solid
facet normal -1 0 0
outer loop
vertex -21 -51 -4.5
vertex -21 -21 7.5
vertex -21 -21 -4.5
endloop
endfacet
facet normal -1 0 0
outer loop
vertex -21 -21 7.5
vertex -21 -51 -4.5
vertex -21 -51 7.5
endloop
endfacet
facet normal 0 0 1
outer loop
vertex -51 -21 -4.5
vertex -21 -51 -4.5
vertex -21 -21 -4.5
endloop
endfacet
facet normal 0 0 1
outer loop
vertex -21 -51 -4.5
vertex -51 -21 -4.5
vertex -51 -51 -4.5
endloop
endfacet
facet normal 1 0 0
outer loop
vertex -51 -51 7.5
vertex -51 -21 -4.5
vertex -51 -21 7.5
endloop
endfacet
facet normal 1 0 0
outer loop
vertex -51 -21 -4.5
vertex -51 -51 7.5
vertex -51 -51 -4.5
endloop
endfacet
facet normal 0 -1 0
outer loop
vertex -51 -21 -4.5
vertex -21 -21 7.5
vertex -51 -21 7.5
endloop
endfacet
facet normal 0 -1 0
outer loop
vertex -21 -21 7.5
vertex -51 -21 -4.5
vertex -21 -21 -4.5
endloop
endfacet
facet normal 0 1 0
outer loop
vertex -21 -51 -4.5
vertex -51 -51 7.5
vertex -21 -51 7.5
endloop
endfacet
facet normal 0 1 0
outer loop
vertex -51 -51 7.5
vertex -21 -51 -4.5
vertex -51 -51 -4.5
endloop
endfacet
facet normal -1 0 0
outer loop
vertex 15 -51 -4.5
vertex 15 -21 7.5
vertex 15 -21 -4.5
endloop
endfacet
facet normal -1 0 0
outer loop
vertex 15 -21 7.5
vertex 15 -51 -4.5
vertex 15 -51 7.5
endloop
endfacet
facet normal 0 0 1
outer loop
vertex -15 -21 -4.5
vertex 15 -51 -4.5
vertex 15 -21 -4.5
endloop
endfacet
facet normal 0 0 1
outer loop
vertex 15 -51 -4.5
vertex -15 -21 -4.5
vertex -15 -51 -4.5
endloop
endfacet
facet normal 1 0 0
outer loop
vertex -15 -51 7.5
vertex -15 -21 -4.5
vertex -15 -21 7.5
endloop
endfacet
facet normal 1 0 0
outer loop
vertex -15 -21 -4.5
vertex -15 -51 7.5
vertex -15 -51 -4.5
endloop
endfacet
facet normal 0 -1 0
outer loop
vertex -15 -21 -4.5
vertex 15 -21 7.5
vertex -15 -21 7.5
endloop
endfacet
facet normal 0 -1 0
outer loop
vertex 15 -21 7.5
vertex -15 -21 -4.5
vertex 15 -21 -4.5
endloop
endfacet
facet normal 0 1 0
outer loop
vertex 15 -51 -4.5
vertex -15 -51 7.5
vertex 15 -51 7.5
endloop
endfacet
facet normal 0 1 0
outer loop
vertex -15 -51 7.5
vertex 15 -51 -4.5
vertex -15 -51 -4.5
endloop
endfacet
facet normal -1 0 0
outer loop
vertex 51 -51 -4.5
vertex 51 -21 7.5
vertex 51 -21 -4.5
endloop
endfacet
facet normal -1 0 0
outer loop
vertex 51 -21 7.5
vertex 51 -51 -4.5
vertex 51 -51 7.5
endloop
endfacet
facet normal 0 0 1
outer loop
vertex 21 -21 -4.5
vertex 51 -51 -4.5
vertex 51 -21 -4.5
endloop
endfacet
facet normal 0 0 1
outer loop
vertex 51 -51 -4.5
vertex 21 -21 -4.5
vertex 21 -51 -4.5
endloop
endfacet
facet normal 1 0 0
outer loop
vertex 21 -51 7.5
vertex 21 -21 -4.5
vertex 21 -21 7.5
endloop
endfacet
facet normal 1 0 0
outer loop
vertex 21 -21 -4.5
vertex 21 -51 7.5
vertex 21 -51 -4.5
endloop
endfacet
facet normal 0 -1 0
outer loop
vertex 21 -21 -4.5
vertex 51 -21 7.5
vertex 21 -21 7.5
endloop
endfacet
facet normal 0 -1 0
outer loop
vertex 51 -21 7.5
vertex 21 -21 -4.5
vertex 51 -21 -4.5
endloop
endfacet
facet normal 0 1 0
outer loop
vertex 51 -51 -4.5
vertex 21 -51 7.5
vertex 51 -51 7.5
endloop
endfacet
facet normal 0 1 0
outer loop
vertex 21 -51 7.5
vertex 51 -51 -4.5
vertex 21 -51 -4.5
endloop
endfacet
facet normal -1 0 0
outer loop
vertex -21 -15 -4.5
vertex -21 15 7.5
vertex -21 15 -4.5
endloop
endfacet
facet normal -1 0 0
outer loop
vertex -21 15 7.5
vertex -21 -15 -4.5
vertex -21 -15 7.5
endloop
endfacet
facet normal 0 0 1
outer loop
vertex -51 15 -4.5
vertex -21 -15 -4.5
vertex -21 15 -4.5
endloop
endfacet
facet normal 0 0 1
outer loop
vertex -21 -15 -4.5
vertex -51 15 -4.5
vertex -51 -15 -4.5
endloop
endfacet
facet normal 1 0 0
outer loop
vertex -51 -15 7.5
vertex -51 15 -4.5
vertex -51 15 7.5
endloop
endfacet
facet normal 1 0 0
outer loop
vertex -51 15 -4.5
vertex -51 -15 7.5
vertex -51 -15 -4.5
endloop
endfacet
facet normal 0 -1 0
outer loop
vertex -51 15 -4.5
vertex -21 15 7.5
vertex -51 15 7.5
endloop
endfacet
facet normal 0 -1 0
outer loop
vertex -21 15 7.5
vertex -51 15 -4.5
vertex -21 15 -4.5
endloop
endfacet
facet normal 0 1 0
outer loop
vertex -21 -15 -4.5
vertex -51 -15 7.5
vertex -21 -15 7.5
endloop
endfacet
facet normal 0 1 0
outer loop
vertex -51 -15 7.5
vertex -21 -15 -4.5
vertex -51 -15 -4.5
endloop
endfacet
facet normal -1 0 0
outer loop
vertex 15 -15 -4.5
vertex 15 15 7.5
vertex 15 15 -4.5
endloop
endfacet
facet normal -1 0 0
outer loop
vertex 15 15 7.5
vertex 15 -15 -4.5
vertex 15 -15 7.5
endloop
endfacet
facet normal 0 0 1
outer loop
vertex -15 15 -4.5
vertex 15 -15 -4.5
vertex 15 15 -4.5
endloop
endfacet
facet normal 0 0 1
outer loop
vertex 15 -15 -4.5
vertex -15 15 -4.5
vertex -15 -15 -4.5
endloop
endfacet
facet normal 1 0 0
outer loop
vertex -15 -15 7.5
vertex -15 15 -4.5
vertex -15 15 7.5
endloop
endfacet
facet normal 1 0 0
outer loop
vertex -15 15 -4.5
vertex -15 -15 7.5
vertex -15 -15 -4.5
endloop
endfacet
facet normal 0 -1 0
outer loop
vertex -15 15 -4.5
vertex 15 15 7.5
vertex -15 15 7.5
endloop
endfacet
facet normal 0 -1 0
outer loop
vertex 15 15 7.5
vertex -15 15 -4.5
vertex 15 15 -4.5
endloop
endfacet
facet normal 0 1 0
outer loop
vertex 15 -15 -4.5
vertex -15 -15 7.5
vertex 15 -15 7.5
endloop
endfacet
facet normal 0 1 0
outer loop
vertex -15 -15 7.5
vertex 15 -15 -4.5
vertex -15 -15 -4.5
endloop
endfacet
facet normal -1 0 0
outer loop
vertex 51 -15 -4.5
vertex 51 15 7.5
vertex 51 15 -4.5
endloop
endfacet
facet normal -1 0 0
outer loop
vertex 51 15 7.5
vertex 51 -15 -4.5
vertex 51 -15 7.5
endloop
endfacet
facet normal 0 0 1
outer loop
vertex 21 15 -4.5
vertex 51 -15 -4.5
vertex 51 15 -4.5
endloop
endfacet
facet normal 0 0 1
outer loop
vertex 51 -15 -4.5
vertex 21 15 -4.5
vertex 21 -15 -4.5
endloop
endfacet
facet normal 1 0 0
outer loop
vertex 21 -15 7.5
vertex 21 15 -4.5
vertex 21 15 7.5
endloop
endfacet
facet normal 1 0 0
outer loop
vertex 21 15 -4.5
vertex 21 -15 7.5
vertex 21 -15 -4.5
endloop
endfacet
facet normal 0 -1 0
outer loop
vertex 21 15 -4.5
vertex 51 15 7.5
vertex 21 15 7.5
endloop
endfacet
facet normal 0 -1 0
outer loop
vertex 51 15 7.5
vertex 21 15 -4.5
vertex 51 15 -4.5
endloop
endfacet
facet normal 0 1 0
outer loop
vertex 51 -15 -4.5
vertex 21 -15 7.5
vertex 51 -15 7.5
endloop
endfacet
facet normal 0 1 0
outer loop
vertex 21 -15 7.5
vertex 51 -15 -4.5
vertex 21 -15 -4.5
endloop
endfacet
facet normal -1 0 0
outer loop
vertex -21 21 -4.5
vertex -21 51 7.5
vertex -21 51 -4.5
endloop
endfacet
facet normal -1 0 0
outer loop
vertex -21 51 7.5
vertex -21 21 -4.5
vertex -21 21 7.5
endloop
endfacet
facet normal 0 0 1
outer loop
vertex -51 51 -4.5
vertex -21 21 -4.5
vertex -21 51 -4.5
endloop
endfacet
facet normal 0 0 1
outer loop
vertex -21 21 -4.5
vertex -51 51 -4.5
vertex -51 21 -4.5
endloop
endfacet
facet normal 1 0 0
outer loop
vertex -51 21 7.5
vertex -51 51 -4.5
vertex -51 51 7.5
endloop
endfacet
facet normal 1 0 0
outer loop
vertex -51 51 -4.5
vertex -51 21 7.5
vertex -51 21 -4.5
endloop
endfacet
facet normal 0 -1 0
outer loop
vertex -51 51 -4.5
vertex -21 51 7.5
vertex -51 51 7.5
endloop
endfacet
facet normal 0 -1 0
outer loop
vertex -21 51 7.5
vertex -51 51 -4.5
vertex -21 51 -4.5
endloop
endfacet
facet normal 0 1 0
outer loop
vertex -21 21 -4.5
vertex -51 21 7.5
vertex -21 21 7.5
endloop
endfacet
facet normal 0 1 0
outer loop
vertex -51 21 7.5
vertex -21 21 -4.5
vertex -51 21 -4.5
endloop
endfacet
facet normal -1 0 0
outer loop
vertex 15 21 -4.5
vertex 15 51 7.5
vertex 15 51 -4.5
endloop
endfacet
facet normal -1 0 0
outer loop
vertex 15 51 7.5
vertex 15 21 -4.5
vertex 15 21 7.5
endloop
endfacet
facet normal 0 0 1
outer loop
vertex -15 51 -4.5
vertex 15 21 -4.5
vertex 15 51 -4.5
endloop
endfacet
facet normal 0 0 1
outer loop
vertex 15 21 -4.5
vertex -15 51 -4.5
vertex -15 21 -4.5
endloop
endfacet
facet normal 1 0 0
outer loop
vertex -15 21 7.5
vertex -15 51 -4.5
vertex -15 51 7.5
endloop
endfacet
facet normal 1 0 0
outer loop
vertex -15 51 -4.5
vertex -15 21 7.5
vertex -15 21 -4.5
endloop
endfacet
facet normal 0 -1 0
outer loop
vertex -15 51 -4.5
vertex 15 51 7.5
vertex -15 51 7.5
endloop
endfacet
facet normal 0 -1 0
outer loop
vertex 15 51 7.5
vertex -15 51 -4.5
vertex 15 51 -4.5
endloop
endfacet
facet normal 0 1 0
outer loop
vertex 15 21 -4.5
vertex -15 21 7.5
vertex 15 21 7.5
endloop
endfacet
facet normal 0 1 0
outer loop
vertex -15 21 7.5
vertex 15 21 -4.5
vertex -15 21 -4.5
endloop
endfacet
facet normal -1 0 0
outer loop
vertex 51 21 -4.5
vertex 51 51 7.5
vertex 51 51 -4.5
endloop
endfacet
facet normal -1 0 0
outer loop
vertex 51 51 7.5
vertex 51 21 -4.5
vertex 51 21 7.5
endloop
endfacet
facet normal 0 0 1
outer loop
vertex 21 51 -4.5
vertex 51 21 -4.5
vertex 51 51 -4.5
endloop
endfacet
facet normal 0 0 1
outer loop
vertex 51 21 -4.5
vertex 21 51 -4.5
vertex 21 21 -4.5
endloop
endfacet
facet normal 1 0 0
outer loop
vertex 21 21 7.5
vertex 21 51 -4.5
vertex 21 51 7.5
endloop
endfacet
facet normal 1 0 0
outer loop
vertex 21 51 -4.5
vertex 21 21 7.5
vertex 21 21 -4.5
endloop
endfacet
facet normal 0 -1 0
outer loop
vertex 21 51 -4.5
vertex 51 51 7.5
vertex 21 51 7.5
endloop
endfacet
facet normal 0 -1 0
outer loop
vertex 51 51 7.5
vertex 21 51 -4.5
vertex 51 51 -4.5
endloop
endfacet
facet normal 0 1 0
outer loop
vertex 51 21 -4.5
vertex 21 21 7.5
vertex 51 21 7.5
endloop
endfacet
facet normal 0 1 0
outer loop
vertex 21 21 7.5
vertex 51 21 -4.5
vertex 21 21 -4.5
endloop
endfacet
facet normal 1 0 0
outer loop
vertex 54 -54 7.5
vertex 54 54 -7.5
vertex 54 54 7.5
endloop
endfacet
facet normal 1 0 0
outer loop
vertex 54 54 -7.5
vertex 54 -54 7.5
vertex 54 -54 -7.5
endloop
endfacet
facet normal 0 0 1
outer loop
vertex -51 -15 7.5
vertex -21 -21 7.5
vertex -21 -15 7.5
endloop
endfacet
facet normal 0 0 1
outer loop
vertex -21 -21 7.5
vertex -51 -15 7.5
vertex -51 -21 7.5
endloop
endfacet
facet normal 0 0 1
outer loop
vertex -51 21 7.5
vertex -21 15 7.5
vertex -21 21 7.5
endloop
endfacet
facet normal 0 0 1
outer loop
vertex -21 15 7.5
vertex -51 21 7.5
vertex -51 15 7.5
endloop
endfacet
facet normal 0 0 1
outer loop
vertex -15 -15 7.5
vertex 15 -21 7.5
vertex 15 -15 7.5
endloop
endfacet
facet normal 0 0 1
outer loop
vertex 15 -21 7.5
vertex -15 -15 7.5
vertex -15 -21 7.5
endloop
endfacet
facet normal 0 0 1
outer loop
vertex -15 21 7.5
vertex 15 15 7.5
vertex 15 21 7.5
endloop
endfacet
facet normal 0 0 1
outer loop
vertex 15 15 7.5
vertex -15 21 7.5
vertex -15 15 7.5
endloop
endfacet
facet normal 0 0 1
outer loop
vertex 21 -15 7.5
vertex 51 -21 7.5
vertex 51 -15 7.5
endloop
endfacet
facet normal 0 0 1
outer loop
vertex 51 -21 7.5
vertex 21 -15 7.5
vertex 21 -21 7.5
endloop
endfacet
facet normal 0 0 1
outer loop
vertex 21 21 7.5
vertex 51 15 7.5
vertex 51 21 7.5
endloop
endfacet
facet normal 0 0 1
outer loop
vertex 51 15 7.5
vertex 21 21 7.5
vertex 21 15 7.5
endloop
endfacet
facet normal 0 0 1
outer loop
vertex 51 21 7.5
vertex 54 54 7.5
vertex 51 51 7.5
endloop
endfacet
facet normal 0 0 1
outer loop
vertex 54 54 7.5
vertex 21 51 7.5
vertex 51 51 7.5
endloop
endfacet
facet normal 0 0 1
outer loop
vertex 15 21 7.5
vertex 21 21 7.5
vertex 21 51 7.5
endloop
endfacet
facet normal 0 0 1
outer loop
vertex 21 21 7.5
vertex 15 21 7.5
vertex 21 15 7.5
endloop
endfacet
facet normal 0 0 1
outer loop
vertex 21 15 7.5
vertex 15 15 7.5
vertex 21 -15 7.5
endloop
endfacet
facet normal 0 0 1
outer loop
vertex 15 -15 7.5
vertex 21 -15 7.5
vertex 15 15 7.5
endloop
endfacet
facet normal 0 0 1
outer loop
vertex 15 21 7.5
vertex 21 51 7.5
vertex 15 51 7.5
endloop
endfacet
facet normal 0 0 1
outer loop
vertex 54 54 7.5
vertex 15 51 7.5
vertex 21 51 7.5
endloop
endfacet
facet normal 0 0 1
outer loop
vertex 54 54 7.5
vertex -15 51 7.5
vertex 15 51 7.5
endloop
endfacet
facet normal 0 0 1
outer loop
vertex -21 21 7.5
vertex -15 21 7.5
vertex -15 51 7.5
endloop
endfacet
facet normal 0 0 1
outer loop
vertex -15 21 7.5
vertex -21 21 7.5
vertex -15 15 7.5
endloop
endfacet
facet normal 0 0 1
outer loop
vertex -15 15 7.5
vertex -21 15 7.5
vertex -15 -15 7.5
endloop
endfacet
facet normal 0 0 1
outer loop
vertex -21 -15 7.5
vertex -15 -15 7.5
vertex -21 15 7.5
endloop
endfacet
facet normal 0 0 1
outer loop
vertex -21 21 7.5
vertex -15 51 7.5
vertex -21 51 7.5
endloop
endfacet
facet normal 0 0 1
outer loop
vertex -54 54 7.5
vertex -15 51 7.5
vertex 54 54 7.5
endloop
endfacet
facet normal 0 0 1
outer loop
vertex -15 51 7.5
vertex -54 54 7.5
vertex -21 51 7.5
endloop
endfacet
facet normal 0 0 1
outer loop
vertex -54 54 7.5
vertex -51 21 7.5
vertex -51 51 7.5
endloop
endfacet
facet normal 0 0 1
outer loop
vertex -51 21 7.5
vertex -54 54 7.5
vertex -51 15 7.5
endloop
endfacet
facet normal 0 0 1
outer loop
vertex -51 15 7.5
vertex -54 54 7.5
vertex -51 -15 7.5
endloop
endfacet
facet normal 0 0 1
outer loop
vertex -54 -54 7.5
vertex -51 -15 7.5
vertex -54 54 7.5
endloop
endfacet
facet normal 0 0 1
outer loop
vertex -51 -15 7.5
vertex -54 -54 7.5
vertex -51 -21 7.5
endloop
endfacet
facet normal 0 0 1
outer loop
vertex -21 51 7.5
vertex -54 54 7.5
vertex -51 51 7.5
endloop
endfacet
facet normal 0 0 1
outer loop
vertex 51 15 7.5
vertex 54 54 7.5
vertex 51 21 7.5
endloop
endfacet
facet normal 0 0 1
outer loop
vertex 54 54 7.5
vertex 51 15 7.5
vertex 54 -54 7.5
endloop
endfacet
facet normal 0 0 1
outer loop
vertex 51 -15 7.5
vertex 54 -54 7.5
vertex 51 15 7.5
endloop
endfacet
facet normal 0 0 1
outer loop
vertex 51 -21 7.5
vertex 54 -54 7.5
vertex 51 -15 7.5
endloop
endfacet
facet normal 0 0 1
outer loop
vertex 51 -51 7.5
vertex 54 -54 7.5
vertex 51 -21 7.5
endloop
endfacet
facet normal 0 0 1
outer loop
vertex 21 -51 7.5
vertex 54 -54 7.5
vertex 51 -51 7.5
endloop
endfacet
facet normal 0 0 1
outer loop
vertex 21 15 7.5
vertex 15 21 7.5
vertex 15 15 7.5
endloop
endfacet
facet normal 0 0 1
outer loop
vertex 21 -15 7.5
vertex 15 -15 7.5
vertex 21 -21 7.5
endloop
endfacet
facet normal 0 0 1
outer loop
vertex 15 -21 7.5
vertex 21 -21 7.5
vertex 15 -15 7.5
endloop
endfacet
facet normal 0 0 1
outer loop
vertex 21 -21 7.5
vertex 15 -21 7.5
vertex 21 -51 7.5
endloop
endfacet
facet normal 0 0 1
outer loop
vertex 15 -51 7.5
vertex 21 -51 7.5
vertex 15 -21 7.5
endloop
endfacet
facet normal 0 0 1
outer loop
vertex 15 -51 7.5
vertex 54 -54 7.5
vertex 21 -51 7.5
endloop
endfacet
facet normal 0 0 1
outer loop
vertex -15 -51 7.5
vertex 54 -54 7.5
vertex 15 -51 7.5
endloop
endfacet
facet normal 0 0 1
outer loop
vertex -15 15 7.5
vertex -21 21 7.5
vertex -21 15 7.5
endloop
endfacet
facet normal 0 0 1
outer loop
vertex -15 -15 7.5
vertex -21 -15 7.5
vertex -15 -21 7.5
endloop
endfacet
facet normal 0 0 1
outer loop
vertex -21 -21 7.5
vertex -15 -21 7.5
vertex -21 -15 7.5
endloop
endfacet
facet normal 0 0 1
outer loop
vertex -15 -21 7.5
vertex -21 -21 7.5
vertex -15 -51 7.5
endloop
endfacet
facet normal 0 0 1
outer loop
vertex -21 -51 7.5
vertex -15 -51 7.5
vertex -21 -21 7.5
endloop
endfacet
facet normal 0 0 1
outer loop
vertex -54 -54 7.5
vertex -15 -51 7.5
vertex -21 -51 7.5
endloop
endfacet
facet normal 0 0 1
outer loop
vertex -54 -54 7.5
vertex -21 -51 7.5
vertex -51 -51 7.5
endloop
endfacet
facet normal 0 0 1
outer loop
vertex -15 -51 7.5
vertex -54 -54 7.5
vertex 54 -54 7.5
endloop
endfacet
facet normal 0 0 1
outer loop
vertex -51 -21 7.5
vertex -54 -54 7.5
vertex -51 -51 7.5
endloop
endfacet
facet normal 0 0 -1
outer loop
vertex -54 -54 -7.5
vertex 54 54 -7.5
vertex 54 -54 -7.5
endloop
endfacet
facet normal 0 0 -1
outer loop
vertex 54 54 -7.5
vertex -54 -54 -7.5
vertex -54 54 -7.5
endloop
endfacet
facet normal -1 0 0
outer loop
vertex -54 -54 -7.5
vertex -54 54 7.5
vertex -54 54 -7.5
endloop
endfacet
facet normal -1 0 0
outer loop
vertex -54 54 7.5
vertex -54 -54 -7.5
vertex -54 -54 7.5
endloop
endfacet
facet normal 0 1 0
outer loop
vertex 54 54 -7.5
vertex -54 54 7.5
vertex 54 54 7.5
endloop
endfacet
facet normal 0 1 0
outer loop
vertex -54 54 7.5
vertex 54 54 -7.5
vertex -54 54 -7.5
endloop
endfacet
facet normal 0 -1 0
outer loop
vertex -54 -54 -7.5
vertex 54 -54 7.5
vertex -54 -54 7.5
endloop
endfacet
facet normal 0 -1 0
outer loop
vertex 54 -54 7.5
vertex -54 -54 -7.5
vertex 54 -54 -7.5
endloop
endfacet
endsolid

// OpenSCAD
$fn = 32;

// ----------------------------------------------------------------------
// Pocket plate 108 x 108 x 15
// 3 x 3 pockets 30 mm square, 12 mm deep
// ----------------------------------------------------------------------

// --- parameters (mm) ---
thickness = 15;  // plate thickness
floor_t = 3;     // material left under each pocket
pocket = 30;     // pocket side length
pitch_x = 36;    // pocket pitch along X
pitch_y = 36;    // pocket pitch along Y
cols = 3;        // pockets per row
rows = 3;        // rows of pockets

// --- derived feature positions (mm) ---
depth = thickness - floor_t;        // = 12   pocket depth, down to the floor
span_x = (cols - 1) * pitch_x;      // = 72   distance between outer pockets
span_y = (rows - 1) * pitch_y;      // = 72   distance between outer pocket rows
origin_x = -span_x / 2;             // = -36   X of the first pocket
origin_y = -span_y / 2;             // = -36   Y of the first pocket
plate = [span_x + pocket + 6, span_y + pocket + 6, thickness];  // = [108, 108, 15]   overall size: pockets plus 3 mm of wall on each side
feature_centers = [
  [origin_x + 0 * pitch_x, origin_y + 0 * pitch_y],
  [origin_x + 1 * pitch_x, origin_y + 0 * pitch_y],
  [origin_x + 2 * pitch_x, origin_y + 0 * pitch_y],
  [origin_x + 0 * pitch_x, origin_y + 1 * pitch_y],
  [origin_x + 1 * pitch_x, origin_y + 1 * pitch_y],
  [origin_x + 2 * pitch_x, origin_y + 1 * pitch_y],
  [origin_x + 0 * pitch_x, origin_y + 2 * pitch_y],
  [origin_x + 1 * pitch_x, origin_y + 2 * pitch_y],
  [origin_x + 2 * pitch_x, origin_y + 2 * pitch_y]
];   // pocket centres, used verbatim by the cutter loop

// plate outline, then one pocket per centre in feature_centers
difference() {
  cube(plate, center = true);
  for (centre = feature_centers)
    translate([centre[0] - pocket / 2, centre[1] - pocket / 2, plate[2] / 2 - depth])
      cube([pocket, pocket, depth + 1]);  // centred on the declared pocket centre
}
